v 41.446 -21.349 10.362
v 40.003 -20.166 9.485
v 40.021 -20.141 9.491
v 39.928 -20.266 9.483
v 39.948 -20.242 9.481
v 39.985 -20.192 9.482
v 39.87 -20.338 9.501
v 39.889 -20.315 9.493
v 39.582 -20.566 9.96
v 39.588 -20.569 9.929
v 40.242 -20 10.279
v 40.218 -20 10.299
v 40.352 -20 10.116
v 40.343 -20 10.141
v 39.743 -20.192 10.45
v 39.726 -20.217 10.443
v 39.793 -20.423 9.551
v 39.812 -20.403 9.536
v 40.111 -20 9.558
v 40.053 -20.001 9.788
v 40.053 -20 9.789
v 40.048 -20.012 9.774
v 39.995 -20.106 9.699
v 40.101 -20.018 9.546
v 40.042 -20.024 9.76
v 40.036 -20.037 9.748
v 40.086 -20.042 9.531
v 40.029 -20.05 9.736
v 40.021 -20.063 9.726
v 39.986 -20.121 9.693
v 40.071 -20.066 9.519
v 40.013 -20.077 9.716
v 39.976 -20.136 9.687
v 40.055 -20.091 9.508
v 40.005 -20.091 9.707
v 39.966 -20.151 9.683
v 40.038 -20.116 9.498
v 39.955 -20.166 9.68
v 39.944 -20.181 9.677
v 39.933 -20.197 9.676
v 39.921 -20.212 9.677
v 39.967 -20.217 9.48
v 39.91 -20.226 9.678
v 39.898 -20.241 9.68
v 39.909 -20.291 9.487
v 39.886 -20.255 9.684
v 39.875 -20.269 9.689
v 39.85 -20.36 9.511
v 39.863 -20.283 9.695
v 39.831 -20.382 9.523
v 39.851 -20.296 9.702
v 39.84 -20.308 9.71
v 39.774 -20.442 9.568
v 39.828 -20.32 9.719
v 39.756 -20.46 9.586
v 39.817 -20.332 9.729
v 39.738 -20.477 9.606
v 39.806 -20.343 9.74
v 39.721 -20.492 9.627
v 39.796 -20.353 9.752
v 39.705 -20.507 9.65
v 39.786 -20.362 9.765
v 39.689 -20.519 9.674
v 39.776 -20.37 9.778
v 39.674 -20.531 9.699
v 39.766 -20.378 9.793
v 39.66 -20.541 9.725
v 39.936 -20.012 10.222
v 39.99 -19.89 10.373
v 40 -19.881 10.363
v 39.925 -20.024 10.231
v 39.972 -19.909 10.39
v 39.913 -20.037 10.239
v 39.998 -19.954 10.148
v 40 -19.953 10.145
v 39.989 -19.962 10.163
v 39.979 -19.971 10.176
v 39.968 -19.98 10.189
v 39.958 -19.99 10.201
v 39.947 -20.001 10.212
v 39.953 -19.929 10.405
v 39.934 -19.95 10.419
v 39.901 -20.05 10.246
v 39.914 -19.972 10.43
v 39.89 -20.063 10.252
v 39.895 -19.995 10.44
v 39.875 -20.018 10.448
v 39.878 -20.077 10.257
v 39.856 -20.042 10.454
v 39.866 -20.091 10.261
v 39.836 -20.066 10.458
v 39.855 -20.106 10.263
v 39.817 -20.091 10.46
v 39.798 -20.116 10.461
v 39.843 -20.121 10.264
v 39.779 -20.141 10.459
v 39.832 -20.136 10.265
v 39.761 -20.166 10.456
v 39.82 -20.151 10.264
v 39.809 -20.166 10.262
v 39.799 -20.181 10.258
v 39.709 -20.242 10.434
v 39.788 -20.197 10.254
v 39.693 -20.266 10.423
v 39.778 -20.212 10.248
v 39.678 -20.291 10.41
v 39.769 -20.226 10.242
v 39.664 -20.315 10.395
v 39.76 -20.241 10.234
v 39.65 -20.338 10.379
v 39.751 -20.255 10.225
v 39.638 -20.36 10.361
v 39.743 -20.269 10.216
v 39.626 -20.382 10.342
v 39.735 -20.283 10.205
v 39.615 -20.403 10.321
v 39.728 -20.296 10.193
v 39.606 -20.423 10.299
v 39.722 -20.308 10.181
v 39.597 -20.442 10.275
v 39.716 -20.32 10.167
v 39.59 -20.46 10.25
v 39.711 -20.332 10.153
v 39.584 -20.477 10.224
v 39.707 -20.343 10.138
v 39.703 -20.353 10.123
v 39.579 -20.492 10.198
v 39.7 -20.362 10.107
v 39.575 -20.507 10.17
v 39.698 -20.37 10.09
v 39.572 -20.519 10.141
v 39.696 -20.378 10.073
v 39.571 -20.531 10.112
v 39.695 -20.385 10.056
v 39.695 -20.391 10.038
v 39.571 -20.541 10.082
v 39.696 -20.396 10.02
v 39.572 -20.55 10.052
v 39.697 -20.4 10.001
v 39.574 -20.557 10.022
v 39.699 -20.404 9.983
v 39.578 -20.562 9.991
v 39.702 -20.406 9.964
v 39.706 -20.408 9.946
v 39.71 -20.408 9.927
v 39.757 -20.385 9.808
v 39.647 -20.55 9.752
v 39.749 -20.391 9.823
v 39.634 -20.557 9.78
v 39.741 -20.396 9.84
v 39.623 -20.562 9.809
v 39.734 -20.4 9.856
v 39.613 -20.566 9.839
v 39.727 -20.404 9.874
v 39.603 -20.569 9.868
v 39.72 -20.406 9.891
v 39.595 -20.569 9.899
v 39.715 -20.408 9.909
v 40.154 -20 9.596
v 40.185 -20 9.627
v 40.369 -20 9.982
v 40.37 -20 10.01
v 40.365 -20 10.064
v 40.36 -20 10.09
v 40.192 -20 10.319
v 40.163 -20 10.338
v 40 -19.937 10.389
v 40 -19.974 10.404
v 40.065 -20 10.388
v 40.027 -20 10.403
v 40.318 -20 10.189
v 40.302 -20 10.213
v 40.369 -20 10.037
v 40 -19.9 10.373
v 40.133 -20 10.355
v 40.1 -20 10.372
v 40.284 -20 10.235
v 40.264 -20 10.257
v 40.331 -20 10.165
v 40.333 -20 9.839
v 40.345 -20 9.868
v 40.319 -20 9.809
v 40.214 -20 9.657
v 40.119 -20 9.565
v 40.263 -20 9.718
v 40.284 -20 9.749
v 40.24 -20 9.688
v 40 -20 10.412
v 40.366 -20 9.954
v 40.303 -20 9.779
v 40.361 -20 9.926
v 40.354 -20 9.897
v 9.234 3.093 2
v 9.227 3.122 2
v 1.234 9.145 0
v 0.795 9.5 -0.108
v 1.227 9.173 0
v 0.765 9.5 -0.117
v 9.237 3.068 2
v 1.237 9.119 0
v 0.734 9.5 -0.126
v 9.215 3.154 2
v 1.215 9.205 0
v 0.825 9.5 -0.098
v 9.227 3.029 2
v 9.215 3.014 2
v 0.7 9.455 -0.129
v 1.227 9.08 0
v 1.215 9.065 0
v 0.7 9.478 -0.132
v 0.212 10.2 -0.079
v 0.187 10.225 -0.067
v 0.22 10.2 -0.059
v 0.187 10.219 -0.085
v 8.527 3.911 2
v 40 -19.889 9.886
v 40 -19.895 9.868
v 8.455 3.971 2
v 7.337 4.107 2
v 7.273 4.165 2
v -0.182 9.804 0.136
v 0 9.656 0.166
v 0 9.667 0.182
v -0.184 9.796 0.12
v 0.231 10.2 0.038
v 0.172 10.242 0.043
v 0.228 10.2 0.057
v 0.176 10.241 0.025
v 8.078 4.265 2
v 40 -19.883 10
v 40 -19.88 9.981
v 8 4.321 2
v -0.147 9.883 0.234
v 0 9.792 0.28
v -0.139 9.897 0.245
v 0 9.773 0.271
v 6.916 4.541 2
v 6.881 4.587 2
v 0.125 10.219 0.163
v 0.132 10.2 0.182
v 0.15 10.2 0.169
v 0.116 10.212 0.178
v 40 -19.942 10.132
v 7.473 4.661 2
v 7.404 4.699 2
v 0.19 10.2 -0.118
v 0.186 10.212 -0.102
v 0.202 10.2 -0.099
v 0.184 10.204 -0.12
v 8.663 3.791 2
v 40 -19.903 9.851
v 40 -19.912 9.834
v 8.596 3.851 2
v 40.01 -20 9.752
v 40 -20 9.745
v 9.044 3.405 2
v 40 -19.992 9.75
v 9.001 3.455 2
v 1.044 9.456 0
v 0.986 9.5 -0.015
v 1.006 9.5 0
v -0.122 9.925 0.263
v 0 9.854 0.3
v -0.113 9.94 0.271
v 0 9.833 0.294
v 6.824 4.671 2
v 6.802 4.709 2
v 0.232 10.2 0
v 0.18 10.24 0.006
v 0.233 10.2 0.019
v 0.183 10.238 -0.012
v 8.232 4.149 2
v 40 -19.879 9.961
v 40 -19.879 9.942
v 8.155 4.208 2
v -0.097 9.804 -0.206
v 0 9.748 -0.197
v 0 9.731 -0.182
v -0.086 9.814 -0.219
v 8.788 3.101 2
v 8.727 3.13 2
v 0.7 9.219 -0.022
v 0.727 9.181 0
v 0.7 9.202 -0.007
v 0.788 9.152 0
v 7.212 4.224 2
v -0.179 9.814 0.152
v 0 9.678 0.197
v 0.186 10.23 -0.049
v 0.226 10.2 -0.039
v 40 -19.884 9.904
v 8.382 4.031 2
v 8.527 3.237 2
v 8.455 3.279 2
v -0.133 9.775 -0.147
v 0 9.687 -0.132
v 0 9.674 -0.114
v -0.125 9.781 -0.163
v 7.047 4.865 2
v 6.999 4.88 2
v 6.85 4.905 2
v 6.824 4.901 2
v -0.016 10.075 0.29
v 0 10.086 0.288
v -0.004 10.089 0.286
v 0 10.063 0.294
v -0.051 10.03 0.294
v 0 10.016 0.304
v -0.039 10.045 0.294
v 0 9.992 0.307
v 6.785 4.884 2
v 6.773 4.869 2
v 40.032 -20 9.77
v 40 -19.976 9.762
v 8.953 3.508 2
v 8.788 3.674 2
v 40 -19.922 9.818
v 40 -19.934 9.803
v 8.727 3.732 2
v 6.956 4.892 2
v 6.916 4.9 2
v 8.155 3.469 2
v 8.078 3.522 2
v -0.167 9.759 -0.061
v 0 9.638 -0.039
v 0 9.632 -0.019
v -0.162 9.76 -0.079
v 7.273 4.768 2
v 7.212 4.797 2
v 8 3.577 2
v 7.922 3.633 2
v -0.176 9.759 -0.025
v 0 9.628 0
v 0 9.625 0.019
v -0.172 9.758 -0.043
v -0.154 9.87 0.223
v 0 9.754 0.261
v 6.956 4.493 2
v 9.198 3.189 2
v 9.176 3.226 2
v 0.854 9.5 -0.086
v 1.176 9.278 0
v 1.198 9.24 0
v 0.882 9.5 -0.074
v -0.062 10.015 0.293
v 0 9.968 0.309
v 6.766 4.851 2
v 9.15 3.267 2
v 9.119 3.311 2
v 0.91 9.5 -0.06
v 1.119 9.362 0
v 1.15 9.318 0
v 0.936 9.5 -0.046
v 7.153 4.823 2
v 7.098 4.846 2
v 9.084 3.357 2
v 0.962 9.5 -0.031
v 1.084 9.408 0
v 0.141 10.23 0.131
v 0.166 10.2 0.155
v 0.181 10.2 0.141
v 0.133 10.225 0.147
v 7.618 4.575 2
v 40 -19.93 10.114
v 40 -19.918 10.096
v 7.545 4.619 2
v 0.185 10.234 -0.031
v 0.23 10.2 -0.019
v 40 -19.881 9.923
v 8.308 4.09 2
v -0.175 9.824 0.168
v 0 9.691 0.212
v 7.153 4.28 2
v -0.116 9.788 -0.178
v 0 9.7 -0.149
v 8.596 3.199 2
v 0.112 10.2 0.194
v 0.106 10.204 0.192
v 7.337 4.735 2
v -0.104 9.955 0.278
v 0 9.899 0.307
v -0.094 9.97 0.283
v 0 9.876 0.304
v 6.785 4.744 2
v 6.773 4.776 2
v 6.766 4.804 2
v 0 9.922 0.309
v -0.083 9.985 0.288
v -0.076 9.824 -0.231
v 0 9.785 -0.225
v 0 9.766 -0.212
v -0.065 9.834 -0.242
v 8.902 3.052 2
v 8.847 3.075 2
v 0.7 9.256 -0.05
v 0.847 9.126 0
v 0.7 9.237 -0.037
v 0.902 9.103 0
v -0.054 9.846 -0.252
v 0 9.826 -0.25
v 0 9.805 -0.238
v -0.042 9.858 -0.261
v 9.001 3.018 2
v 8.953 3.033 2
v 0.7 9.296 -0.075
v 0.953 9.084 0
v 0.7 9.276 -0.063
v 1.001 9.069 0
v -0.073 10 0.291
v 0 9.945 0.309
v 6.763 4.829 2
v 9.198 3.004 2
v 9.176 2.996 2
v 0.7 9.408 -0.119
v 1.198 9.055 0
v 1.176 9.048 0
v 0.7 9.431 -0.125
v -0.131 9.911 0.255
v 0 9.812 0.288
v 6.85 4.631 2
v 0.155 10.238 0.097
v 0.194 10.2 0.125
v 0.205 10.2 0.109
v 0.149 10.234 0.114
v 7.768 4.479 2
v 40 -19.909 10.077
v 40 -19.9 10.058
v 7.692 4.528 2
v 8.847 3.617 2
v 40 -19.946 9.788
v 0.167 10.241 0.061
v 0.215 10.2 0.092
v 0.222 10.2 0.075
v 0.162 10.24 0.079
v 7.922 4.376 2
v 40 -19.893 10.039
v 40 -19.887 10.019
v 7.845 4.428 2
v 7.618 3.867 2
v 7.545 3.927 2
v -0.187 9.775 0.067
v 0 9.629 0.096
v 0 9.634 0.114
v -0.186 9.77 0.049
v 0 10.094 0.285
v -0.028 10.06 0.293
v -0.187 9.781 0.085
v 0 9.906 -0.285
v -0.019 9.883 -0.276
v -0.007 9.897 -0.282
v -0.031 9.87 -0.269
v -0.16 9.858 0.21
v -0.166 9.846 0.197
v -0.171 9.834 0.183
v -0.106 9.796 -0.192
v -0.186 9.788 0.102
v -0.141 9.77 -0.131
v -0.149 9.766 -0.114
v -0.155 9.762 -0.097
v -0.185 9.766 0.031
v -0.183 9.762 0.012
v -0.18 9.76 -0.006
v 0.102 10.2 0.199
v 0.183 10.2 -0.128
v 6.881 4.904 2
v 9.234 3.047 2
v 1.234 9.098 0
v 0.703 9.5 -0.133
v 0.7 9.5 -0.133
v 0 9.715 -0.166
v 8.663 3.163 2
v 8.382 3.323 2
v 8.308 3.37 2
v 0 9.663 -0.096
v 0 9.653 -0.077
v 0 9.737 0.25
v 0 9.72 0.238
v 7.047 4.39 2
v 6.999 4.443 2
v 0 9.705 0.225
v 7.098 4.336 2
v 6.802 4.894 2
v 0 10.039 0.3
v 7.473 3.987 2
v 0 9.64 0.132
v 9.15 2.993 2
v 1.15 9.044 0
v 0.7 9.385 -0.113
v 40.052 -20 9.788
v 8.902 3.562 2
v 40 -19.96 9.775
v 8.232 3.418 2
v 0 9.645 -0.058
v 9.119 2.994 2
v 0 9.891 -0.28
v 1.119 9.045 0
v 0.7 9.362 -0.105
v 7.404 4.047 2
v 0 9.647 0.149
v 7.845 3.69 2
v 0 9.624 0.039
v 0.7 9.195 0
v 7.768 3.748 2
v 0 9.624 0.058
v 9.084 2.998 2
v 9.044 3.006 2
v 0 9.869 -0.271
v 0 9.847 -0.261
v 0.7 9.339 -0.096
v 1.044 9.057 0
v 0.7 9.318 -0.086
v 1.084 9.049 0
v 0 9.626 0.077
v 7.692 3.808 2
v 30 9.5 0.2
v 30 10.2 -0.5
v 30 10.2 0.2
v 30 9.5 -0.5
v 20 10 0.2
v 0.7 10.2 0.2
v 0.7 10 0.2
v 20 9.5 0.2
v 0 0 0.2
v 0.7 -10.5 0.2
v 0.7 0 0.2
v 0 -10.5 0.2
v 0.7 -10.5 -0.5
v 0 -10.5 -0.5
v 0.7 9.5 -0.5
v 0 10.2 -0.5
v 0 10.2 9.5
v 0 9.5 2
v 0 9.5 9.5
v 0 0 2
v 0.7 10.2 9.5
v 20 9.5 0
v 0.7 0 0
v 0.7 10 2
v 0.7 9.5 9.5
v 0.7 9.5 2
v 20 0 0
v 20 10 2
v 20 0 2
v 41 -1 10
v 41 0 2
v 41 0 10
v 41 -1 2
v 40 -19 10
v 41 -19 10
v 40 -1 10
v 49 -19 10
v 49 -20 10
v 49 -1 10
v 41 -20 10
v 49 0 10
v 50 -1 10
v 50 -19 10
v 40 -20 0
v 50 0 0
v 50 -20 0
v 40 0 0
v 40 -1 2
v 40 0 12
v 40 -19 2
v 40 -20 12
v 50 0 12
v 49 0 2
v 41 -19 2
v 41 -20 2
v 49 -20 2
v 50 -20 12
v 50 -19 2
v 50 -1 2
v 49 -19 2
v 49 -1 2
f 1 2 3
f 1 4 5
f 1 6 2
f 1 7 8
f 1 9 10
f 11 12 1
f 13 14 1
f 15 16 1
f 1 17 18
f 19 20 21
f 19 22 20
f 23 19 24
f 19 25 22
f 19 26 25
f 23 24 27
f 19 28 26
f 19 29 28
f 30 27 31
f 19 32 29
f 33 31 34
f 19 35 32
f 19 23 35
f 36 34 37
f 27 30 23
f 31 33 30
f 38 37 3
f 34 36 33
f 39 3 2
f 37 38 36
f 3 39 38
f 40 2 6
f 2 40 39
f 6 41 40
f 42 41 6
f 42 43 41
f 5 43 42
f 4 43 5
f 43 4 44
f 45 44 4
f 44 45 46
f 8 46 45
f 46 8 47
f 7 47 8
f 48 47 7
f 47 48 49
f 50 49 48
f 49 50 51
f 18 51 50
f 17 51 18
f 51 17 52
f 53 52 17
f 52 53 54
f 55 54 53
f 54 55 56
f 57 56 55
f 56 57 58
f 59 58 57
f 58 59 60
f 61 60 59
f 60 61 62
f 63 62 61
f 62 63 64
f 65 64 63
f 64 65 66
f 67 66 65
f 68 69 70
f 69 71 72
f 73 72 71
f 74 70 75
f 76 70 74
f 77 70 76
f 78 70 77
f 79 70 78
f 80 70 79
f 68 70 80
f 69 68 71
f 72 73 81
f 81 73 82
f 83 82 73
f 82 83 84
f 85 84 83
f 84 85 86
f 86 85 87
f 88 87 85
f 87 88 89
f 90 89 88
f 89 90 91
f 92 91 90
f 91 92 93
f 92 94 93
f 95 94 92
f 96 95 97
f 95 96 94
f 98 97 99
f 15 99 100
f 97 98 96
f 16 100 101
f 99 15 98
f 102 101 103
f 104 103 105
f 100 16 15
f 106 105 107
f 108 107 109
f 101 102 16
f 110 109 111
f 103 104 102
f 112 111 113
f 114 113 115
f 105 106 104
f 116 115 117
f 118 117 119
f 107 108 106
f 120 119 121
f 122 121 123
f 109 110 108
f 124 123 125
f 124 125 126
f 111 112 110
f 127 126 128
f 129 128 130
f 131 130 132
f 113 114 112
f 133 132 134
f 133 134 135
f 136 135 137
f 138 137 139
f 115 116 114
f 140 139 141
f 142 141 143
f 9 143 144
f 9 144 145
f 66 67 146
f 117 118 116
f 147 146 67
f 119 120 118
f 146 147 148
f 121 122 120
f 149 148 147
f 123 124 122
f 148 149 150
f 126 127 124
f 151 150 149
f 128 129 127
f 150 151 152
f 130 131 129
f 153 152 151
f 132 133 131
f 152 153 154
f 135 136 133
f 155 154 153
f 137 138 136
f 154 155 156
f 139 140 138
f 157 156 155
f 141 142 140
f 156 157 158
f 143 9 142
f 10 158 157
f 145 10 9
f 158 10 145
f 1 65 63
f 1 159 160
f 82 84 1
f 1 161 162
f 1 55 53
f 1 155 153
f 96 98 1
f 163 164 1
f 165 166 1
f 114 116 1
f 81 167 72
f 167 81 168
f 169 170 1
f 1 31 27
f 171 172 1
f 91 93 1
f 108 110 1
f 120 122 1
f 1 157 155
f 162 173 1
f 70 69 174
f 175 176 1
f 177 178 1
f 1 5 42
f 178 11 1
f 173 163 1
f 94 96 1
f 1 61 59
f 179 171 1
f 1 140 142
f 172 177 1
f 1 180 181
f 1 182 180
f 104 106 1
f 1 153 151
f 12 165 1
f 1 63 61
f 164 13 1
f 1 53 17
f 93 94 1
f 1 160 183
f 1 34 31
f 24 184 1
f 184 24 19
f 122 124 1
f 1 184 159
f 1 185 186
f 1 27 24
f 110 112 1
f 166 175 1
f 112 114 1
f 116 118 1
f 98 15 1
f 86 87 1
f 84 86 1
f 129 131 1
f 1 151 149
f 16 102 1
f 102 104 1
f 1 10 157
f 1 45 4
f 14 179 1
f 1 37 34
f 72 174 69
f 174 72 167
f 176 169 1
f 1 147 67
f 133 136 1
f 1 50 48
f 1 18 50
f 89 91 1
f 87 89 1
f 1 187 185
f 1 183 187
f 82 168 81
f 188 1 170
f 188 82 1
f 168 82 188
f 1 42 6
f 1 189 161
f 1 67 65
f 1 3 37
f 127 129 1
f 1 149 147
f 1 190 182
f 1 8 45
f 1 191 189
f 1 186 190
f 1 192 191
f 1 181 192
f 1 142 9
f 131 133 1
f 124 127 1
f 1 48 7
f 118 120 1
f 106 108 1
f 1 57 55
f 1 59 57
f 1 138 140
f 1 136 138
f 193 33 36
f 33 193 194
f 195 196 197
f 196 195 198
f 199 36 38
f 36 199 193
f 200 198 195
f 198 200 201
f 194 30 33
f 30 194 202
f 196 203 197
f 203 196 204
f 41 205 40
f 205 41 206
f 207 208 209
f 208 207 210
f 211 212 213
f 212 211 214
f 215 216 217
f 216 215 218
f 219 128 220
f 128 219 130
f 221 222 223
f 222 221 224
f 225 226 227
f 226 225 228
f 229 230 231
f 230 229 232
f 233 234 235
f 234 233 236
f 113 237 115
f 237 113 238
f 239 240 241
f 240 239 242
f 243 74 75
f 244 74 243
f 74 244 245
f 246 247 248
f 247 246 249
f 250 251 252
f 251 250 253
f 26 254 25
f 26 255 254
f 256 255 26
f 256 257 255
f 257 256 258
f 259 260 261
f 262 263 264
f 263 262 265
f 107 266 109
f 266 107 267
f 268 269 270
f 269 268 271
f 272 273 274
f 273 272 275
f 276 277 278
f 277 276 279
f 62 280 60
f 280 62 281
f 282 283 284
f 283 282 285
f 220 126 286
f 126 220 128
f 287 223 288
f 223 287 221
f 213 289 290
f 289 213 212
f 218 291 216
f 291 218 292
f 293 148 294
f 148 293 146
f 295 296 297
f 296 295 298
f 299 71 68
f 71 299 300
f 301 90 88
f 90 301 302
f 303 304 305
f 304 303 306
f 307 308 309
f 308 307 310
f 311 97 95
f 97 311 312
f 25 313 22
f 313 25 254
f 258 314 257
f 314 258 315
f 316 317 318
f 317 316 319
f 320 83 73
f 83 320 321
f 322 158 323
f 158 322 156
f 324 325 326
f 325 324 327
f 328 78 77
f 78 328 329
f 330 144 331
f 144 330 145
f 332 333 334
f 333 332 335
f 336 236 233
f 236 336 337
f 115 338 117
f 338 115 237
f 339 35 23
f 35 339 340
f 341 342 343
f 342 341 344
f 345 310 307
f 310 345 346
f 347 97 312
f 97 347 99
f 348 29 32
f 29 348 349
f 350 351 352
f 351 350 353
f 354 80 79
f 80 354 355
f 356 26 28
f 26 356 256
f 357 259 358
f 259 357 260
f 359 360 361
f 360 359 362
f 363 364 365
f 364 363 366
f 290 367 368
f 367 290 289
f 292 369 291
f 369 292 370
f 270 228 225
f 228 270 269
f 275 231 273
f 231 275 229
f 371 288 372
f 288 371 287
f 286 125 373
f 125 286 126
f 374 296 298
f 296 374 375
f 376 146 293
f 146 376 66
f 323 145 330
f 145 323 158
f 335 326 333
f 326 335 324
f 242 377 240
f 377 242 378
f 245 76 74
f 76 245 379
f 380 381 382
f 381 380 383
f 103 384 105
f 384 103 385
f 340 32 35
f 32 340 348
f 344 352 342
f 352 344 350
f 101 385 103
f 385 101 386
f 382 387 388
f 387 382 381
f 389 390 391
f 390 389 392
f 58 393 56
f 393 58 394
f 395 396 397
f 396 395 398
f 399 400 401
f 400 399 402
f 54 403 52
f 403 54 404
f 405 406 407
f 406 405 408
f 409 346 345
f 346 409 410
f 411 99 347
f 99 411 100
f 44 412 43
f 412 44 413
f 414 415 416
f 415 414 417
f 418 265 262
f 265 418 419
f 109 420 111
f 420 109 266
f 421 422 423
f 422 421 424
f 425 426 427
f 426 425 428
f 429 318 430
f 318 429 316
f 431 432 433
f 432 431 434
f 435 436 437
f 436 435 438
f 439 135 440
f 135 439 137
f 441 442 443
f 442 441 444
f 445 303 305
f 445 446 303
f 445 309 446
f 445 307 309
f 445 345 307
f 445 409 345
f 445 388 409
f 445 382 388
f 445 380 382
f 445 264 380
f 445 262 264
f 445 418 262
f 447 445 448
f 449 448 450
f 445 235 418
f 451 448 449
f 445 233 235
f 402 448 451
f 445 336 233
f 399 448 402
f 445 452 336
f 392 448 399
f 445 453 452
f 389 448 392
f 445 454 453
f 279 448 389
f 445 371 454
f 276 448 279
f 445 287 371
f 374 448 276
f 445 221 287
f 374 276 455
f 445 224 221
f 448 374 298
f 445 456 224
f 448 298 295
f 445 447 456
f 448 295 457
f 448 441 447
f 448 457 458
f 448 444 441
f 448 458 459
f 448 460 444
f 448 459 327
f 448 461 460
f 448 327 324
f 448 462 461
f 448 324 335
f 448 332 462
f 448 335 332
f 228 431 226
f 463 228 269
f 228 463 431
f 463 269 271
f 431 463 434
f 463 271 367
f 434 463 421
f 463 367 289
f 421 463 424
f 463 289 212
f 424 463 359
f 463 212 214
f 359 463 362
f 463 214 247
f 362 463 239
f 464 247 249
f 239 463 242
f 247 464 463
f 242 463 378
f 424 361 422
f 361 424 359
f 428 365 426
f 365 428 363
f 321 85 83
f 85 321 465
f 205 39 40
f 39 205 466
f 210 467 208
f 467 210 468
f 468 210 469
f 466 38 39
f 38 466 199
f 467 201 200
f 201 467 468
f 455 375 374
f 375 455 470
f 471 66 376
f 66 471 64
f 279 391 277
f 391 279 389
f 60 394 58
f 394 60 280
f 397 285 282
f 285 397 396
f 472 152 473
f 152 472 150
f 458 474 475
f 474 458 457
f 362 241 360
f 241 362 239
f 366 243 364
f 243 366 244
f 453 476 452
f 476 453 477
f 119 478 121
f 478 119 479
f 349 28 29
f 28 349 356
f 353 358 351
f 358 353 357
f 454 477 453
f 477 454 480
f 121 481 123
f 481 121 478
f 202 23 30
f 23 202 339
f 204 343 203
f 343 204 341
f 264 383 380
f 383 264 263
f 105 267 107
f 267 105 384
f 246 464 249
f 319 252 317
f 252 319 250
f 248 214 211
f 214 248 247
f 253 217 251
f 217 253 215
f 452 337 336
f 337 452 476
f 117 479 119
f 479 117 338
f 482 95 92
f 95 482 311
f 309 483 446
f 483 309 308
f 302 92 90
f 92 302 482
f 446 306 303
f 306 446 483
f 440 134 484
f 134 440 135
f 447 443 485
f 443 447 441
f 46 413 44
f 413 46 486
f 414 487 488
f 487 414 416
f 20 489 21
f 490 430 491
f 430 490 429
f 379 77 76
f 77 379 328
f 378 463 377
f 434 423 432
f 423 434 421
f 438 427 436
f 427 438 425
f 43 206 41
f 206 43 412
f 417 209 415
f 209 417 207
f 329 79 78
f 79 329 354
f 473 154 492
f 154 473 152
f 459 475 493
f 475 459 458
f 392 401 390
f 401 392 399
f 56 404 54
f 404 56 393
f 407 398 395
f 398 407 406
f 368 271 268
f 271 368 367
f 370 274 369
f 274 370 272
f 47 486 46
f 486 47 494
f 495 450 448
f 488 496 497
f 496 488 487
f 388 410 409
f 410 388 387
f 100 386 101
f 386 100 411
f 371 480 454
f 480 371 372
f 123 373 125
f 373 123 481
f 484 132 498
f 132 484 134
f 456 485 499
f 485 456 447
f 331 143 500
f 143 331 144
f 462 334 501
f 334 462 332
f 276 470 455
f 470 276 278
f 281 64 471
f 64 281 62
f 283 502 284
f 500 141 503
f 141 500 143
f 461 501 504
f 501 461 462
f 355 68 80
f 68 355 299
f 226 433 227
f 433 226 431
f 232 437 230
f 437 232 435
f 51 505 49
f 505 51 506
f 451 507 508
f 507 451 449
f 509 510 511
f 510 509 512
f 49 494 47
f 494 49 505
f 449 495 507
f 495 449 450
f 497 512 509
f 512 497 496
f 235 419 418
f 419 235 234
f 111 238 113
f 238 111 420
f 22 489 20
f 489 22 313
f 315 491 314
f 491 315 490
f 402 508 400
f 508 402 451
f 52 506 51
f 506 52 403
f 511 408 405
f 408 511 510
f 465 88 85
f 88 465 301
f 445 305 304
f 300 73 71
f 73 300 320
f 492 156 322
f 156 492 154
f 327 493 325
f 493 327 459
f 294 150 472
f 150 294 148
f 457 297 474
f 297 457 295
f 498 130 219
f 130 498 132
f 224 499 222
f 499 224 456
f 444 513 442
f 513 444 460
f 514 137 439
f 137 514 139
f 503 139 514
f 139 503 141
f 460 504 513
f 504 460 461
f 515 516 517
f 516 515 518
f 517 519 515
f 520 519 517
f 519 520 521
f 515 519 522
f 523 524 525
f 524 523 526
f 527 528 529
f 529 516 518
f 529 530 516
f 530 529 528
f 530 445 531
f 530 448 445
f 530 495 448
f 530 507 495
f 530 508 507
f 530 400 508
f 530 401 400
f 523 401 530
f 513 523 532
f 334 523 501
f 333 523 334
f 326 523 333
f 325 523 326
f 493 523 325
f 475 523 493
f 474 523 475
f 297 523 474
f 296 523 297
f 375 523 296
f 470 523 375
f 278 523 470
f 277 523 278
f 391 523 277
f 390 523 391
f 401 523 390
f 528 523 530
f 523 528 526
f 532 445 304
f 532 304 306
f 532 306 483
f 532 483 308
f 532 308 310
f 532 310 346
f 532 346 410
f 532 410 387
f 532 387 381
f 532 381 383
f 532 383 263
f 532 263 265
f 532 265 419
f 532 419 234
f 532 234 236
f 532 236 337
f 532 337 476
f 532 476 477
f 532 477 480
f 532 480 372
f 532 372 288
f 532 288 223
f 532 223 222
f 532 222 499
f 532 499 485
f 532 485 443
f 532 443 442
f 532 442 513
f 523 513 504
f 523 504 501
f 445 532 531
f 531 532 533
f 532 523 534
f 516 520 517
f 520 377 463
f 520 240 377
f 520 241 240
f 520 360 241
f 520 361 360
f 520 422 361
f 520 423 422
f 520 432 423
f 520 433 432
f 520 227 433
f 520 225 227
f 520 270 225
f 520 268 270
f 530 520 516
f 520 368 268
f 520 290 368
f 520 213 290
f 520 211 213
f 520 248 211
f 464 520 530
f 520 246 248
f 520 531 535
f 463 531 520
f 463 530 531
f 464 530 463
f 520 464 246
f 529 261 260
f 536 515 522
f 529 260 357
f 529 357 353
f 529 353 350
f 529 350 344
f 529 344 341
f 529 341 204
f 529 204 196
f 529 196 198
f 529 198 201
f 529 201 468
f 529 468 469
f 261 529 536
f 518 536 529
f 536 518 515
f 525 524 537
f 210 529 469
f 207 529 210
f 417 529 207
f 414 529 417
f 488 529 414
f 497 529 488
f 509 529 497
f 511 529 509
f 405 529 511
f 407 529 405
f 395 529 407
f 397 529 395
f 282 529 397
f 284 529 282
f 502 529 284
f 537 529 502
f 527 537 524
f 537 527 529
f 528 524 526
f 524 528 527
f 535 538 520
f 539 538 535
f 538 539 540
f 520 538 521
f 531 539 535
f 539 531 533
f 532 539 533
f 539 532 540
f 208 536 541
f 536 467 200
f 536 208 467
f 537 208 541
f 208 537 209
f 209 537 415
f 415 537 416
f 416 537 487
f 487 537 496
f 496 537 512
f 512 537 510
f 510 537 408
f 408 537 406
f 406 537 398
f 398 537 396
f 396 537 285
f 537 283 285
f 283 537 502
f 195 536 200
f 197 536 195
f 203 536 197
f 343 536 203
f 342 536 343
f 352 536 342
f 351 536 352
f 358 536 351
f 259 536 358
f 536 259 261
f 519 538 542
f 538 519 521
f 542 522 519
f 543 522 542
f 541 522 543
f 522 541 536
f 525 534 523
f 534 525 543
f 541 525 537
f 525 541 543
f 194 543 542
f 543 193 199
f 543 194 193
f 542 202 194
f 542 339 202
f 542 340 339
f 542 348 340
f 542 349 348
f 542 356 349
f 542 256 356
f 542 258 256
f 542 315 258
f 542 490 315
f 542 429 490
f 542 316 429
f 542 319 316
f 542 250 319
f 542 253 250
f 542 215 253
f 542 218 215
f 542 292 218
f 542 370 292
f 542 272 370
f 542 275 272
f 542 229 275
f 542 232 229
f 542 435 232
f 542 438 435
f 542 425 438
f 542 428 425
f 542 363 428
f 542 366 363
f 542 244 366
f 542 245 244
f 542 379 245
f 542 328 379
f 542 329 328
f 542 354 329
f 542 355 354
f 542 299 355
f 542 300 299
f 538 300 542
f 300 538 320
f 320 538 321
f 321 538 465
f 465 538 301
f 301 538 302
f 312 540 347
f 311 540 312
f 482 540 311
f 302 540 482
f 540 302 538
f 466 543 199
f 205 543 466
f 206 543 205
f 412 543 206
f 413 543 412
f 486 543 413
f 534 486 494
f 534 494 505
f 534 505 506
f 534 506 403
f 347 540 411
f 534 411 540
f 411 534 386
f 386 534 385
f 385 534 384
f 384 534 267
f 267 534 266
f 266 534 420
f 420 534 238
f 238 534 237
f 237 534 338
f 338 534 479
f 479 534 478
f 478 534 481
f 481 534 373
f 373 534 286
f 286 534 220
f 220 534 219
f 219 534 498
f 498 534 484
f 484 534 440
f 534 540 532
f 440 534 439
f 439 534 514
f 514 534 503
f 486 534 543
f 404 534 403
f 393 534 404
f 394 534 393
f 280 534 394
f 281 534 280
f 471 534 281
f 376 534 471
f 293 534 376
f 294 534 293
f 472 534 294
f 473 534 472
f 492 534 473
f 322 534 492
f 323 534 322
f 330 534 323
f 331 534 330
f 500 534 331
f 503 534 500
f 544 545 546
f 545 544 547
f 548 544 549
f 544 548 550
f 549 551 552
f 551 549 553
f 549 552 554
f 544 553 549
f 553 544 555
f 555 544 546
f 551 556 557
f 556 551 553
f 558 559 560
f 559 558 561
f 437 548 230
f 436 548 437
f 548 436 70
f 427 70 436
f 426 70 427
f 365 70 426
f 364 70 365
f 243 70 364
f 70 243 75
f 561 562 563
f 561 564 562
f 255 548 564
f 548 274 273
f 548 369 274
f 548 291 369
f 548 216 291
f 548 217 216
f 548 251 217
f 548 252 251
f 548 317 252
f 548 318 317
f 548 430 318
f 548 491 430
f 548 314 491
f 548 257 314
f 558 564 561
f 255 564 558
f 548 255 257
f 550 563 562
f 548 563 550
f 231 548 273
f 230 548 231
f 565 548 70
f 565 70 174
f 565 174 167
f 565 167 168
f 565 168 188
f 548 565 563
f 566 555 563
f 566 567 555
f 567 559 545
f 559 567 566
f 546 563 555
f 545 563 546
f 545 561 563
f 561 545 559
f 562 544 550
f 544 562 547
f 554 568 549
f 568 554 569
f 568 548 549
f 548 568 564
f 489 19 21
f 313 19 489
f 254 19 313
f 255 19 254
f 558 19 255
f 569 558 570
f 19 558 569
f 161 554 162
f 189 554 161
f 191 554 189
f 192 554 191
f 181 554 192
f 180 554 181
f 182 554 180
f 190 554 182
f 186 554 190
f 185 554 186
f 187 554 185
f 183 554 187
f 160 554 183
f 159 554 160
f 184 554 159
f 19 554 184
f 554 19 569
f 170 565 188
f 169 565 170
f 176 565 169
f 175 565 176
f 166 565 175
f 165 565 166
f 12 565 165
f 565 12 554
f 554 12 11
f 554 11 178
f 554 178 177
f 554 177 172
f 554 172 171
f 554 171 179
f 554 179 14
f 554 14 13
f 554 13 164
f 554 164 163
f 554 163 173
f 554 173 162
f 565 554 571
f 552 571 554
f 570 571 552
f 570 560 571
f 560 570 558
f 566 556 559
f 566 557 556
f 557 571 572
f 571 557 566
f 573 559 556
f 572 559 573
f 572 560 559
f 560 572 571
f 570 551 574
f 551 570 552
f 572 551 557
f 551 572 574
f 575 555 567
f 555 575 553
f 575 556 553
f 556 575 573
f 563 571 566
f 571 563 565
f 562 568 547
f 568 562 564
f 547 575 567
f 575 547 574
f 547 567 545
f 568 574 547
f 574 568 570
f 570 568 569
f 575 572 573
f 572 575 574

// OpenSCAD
x = $t * 40;

//recommended FPS: 30, steps: 100

module rotate_about_pt(a, v, pt){
    translate(pt)
        rotate(a, v)
            translate(-pt)
                children();
} 
// 3D move

/* A - - - - B
   |         |
   |         |
   D - - - - C
Object in projection at OX is this figure. 
It rotates about poles-points: A, B, C, D
*/

shall("A");


module rot(){
    rotate([90, 0, 0]) translate([20, 17, 30])
    text("ω", size = 7);
    translate([30,-30,20])
    union(){
        translate([0,0,-5]) cylinder(5,0.2,0.2);
        cylinder(3,0.8,0);
        $fn = 100;
    } 
}  

module pole_X(x, y, z, x1, y1, z1, cx, cy){
    union(){
        translate([x,y,z])
        color("Red") cube([1,1,1.5]);
        translate([x1,y1,z1])
        color("Blue") union(){
            translate(cx) cube([30,0.7,0.7]);
            translate(cy) cube([0.7,20,0.7]);
            cube([0.7,0.7,10]);
        }  
    }          
    color([0.5, 1, 0.0], 0.8) cube([20,10,1]); 
}    
    

module pole_A(){
    pole_X(0,9,0,0,9.5,-0.5,[0,0,0],[0,-20,0]);   
}

module pole_B(){
    pole_X(19,9,0,19.5,9.5,-0.5, [-30,0,0],[0,-20,0]);  
}

module pole_C(){
    pole_X(19,0,0,19.5,-0.5,-0.5, [-30,0,0],[0,0,0]);   
}

module pole_D(){
    pole_X(0,0,0,-0.5,-0.5,-0.5, [0,0,0],[0,0,0]);
}

module vect(abs_a){
    color ("Red")union(){
    translate([0,0,abs_a]) cylinder(2,0.5,0);    
    cylinder(abs_a, 0.3, 0.3);
    $fn = 100;
    }    
} 

// first pole - point A
module shall(pole){
    if(pole == chr(65)){
       
        if(x <= 25){
            translate([0,10,0])
            rotate(atan(4), [0,1,0]) 
            rotate(acos(13/sqrt(10*26)), [1,0,0])
            vect(sqrt(1600 + 1000));     
            translate([x*(8 / 5), -x*(6 / 5), x*(2 / 5)])
            {
                 pole_A();
            }    
        }
        else if(x >= 25){
            rot();
            translate([40,-30,10])
            rotate_about_pt(($t - 0.625)*250, [0,0,1], [0,10,0])
            {
                pole_A();
            } 
        }    
    }

    // second pole - point B

    if(pole == chr(66)){
          
        if(x <= 25){
            translate([20,10,0])
            rotate(atan(2), [0,1,0])
            rotate(acos(5/sqrt(30)), [1,0,0])
            vect(sqrt(600)); 
            translate([x*(4 / 5), -x*(2 / 5), x*(2 / 5)])
            {
                pole_B();
            }    
        }
        else if(x >= 25){
            rot();
            translate([20,-10,10])
            rotate_about_pt(($t - 0.625)*250, [0,0,1], [20,10,0])
            {
                pole_B(); 
            } 
        }    
    }

    // third pole - point C

    if(pole == chr(67)){
        
        if(x <= 30){
            translate([20,0,0])
            rotate(atan(3), [0,1,0]) 
            vect(sqrt(900 + 100));  
            translate([x, 0, x/3]){
                pole_C();
            } 
        }
        else if(x >= 30){
            rot();
            translate([30,0,10])
            rotate_about_pt(($t - 0.75)*370, [0,0,1], [20,0,0]){
                pole_C();
            }
        }    
    }

    // fourth pole - point D

    if(pole == chr(68)){

        if(x <= 25){
            translate([0,0,0])
            rotate(atan(5), [0,1,0])
            rotate(acos(26/sqrt(30*26)), [1,0,0])
            vect(sqrt(2500+400+100));      
            translate([2*x, -x*(4 / 5), x * (2 / 5)]){
                pole_D();
            } 
        }
        else if(x >= 25){
            rot();    
            translate([50,-20,10])
            rotate_about_pt(($t - 0.625)*250, [0,0,1], [0,0,0]){
               pole_D();
            } 
        }    
    }

    //start location

    color([0.3, 0.3, 0, 0.1]) union(){
        translate([19,9,0])
        color("Red") cube([1,1,1.2]);
        translate([0,9,0])
        color("Red") cube([1,1,1.2]);
        translate([0,0,0])
        color("Red") cube([1,1,1.2]);
        translate([19,0,0])
        color("Red") cube([1,1,1.2]);
        cube([20,10,2]);
        translate([40,-1,0])cube([1,1,10]);
        translate([40,-20,0])cube([1,1,10]);
        translate([49,-20,0])cube([1,1,10]);
        translate([49,-1,0])cube([1,1,10]);
    }

    // finish location
    translate([20,-10,10]) rotate_about_pt(90, [0,0,1], [20,10,0])
    color([0.3, 0.3, 0, 0.1]) union(){
        translate([19,9,0])
        color("Red") cube([1,1,1.2]);
        translate([0,9,0])
        color("Red") cube([1,1,1.2]);
        translate([0,0,0])
        color("Red") cube([1,1,1.2]);
        translate([19,0,0])
        color("Red") cube([1,1,1.2]);
        cube([20,10,2]);
        translate([0,0,-10])cube([20,10,2]);
    }
}
